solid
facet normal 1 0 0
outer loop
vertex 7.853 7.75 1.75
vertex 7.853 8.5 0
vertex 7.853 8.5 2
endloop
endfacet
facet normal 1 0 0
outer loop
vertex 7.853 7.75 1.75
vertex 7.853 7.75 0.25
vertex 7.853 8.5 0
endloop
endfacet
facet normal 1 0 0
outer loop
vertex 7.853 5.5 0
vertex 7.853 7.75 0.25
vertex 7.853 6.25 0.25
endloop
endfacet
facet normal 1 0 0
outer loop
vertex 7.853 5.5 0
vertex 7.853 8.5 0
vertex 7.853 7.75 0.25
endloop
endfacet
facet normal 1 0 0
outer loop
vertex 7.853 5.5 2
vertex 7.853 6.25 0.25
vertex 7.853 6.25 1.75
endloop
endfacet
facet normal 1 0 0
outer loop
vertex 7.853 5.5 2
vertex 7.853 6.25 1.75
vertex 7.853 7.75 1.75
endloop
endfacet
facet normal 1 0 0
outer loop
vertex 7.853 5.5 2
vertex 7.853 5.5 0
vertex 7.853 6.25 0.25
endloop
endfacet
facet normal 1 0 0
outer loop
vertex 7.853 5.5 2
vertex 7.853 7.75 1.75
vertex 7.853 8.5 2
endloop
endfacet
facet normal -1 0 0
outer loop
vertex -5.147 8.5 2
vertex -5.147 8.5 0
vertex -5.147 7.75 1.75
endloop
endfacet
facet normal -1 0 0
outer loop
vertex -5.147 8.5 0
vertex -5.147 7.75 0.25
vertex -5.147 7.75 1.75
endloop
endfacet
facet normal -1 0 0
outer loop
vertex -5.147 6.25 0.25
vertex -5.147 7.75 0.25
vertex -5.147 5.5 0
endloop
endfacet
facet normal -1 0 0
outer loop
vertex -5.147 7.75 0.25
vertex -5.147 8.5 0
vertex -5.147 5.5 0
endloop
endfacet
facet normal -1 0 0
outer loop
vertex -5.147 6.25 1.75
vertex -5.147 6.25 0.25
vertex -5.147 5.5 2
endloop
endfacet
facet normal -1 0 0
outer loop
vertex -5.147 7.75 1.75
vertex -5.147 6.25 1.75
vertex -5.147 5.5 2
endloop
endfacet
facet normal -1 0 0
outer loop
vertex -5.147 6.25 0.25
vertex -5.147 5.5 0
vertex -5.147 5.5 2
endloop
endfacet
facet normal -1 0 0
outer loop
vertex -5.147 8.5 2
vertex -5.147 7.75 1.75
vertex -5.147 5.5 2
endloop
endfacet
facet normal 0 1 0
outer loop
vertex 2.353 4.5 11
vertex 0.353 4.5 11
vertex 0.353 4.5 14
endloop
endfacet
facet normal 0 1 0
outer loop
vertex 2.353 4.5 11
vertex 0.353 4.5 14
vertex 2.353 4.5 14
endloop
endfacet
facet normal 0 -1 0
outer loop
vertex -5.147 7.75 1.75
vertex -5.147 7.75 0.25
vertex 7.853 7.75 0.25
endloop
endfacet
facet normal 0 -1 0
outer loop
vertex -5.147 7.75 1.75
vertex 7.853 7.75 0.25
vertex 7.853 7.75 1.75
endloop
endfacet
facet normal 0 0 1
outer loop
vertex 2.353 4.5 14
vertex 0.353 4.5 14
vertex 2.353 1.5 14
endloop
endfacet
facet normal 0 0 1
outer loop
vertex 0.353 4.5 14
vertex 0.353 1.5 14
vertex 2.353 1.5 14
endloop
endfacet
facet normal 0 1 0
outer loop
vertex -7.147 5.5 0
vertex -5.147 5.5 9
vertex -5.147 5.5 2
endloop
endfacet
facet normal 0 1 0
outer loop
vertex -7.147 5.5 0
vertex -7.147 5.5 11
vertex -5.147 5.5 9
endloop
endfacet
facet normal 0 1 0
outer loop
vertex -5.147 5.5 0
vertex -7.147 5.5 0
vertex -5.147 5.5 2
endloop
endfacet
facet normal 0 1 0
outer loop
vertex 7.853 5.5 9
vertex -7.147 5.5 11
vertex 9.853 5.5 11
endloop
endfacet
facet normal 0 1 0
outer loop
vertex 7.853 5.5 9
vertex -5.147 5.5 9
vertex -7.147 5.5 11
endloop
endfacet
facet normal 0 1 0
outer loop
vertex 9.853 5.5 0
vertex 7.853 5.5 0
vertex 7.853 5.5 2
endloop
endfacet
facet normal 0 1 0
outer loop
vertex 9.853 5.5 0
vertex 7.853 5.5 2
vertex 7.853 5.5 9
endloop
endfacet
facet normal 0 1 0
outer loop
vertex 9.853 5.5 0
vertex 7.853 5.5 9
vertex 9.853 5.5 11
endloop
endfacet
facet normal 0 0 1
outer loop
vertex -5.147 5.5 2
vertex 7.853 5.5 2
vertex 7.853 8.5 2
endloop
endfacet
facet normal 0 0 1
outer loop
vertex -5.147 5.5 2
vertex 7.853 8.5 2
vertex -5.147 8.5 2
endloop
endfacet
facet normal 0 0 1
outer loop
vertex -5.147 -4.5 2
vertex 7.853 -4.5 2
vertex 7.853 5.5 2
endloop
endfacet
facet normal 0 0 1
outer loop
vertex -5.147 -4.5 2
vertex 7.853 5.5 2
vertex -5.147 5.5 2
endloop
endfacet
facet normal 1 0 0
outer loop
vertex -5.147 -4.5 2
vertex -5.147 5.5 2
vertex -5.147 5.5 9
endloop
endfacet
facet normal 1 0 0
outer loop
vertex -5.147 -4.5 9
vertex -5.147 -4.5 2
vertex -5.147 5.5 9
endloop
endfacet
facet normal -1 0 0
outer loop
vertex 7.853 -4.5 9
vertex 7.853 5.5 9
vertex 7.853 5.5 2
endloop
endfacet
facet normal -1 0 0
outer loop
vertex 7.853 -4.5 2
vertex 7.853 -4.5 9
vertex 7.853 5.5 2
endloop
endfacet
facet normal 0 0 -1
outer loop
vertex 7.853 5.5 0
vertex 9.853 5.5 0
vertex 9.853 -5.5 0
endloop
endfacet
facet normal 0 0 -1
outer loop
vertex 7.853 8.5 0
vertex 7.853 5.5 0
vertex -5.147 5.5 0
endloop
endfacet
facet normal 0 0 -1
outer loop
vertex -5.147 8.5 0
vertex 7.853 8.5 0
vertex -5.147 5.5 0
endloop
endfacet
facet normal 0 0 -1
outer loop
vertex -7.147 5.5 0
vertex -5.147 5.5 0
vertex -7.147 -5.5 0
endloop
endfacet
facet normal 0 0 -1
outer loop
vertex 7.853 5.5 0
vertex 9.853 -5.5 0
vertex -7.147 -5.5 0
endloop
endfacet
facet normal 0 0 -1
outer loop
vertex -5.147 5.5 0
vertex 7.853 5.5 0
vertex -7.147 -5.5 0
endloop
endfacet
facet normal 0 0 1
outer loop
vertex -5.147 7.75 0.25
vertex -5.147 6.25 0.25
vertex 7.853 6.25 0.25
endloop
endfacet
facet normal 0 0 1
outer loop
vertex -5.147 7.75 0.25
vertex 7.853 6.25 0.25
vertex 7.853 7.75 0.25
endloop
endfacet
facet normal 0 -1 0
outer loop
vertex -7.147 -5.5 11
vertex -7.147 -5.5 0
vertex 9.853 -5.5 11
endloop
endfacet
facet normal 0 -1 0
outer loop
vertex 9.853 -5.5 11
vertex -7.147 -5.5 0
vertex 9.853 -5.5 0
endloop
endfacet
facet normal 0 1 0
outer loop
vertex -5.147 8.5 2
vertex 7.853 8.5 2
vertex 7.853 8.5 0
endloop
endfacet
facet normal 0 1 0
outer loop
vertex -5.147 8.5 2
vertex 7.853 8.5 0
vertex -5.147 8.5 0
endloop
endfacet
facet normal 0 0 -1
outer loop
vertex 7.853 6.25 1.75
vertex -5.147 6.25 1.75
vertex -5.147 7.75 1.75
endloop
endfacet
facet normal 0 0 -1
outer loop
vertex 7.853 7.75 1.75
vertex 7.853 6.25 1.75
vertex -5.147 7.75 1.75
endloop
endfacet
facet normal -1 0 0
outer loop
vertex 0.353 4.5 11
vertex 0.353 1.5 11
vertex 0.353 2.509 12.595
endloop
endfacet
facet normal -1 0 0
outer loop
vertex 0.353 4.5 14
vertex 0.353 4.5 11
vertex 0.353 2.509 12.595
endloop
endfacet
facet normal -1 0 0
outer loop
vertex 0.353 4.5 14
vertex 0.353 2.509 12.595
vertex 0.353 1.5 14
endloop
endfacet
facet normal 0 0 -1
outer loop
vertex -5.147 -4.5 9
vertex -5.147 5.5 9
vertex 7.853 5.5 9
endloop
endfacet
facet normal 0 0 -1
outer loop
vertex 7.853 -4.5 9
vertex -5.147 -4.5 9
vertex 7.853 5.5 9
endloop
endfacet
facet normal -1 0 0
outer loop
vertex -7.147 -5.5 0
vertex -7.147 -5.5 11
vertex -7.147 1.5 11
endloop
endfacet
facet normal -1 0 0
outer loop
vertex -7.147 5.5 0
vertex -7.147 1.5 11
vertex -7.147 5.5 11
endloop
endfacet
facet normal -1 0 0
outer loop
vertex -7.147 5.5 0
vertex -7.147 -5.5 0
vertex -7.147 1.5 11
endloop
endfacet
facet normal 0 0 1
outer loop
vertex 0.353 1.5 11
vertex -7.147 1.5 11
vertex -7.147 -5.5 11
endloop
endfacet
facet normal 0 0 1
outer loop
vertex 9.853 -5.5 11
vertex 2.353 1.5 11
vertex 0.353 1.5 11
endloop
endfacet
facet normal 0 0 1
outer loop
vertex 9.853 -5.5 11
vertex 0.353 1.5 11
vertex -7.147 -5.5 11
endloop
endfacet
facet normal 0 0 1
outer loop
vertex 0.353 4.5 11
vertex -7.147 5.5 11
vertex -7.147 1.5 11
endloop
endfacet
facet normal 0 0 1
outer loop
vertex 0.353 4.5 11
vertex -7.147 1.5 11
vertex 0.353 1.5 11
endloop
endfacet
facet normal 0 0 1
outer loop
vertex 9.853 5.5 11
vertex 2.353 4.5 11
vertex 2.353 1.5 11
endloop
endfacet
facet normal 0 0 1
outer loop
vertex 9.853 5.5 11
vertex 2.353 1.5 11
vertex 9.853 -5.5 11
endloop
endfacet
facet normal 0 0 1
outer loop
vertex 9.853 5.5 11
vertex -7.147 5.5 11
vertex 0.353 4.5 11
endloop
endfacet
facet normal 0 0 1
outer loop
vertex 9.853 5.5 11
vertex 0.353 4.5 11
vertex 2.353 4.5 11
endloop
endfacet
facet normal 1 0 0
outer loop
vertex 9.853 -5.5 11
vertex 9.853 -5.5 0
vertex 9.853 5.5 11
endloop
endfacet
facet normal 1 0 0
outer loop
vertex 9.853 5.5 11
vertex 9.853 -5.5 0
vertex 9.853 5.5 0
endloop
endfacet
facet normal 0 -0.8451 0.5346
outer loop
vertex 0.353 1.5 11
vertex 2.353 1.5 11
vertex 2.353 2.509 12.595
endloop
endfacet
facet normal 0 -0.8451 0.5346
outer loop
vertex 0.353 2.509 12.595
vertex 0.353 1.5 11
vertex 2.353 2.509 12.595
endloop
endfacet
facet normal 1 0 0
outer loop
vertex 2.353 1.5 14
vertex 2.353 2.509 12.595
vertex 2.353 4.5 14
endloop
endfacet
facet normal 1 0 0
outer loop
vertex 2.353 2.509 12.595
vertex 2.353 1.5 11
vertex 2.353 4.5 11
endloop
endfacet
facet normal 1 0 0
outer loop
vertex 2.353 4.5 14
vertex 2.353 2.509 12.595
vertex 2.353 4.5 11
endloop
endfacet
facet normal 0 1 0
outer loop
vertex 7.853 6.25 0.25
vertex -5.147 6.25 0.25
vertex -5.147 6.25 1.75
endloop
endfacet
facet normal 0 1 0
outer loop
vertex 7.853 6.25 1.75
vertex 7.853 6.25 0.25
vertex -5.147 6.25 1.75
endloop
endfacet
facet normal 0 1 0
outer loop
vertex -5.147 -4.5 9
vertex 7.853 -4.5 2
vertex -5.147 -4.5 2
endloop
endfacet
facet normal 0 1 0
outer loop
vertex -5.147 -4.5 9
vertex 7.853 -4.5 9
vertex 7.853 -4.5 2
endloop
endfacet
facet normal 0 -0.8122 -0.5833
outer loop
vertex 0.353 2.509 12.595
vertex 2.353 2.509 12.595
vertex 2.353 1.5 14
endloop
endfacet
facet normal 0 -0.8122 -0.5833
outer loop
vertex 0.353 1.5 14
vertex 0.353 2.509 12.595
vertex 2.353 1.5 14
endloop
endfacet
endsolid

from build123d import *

# Parameters (mm, degrees)
F0_W      = 17
F0_H      = 11
F1_DEPTH  = 11
F3_DEPTH  = 10
F4_W      = 13
F4_H      = 2
F5_DEPTH  = 3
F6_W      = 1.5
F6_H      = 1.5
F7_DEPTH  = 15.001
F8_W      = 2
F8_H      = 2
F9_DEPTH  = 3
F11_DEPTH = 9.501
F12_DEPTH = 1


# Not quite as in the source:
# - a feature names something its author has since deleted; it is built from what else it names


with BuildPart() as f1:
    # F0 (on Top) → F1 (new body)
    with BuildSketch(Plane.XY):
        with Locations((1.3527604751, 0)):
            Rectangle(F0_W, F0_H)
    extrude(amount=F1_DEPTH)

    # F2 (on face) → F3 (cut)
    with BuildSketch(Plane(origin=(0, 5.5, 0), x_dir=(-1, 0, 0), z_dir=(0, 1, 0))):
        Polygon((-7.8527604751, 2), (-1.3527604751, 2), (5.1472395249, 2), (5.1472395249, 5.5), (5.1472395249, 9), (-1.3527604751, 9), (-7.8527604751, 9), (-7.8527604751, 5.5), align=None)
    extrude(amount=-F3_DEPTH, mode=Mode.SUBTRACT)

    # F4 (on face) → F5 (join)
    with BuildSketch(Plane(origin=(0, 5.5, 0), x_dir=(-1, 0, 0), z_dir=(0, 1, 0))):
        with Locations((-1.3527604751, 1)):
            Rectangle(F4_W, F4_H)
    extrude(amount=F5_DEPTH)

    # F6 (on face) → F7 (cut, through all)
    with BuildSketch(Plane.YZ.offset(7.8527604751)):
        with Locations((7, 1)):
            Rectangle(F6_W, F6_H)
    extrude(amount=-F7_DEPTH, mode=Mode.SUBTRACT)

    # F8 (on face) → F9 (join)
    with BuildSketch(Plane.XY.offset(11)):
        with Locations((1.3527604751, 2.5)):
            Rectangle(F8_W, F8_H)
    extrude(amount=F9_DEPTH)

    # F10 (on face) → F11 (cut, through all)
    with BuildSketch(Plane.YZ.offset(2.3527604751)):
        Polygon((2.5089287665, 12.594983913), (1.5, 14), (1.5, 11), align=None)
    extrude(amount=-F11_DEPTH, mode=Mode.SUBTRACT)

    # F12 (add): a face of the model
    f12_faces = [f1.faces().sort_by_distance(p)[0] for p in [
        (1.3527604751, 3.5, 12.5),
    ]]
    extrude(f12_faces, amount=F12_DEPTH)


solid = f1.part
